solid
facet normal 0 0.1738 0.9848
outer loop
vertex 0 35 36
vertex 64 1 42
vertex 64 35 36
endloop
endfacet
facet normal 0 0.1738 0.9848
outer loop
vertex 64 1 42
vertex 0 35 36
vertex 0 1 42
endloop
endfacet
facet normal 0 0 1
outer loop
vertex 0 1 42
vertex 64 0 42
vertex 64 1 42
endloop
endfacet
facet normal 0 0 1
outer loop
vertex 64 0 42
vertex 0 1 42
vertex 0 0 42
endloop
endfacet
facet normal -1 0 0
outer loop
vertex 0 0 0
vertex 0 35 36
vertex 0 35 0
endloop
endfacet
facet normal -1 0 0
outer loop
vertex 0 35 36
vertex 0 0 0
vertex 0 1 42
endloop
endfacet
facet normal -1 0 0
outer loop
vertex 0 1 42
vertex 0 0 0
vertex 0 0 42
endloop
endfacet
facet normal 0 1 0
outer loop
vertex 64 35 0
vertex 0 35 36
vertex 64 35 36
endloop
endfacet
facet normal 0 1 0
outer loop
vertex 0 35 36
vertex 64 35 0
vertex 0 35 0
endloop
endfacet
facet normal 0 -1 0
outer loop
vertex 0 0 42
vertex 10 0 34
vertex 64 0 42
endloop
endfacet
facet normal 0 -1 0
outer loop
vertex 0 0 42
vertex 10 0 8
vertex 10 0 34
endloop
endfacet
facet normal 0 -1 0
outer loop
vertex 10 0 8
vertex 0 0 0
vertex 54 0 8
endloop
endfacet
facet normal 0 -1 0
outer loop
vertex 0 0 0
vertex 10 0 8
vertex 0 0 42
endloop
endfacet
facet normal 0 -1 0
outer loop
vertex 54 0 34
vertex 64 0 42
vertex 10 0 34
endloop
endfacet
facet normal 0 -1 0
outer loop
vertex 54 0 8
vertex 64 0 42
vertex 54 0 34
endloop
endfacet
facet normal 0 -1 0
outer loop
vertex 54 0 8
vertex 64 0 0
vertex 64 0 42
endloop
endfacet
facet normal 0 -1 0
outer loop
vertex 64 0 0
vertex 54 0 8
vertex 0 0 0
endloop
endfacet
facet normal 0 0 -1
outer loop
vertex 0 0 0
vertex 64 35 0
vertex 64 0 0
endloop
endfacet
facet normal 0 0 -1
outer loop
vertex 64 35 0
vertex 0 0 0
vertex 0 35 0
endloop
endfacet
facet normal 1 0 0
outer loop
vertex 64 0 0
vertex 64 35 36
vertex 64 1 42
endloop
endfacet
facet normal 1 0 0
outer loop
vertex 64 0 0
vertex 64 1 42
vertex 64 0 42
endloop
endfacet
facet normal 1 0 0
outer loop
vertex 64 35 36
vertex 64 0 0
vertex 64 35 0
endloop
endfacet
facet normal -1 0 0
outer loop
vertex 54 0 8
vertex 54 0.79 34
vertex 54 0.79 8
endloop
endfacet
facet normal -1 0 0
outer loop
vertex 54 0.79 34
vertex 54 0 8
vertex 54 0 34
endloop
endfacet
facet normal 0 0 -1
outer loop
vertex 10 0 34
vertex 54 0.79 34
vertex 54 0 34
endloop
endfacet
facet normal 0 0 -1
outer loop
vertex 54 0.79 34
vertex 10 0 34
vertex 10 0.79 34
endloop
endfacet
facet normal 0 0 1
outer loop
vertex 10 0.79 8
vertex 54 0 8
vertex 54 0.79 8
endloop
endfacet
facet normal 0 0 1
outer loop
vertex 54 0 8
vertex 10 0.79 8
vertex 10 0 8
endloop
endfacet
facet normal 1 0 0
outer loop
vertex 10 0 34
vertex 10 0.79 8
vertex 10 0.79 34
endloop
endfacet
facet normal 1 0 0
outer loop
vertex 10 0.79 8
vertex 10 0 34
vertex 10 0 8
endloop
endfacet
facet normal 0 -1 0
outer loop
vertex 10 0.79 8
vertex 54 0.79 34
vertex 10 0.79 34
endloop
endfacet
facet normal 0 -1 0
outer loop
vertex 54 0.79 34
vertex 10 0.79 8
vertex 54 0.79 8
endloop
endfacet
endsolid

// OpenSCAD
// booth/lt_podium.scad
// LT-meetup diorama props (7/23): single-colour fast prints, assembled later.
//   PART = "podium" : lectern the K151 stands behind (slanted reading top,
//                     front recess for a paper logo card 44 x 26)
//   PART = "stage"  : 150 x 100 x 8 riser plate with chamfered front edge
// Select at CLI:  openscad -D 'PART="stage"' -o stage.stl lt_podium.scad

include <../params.scad>;

PART = "podium";

module podium() {
    difference() {
        // outer block with slanted top (front high -> back low, robot side)
        hull() {
            cube([pod_w, pod_d, 1]);
            translate([0, 0, pod_h_front - 1]) cube([pod_w, 1, 1]);
            translate([0, pod_d - 1, pod_h_back - 1]) cube([pod_w, 1, 1]);
        }
        // NOTE: intentionally solid - a modelled hollow would close into a
        // ~59 mm unsupported bridge under the slanted top. Sparse slicer
        // infill (8-10%) keeps it fast instead.
        // front logo-card recess (paper 44 x 26)
        translate([(pod_w - pod_logo_w) / 2, -0.01, 8])
            cube([pod_logo_w, pod_logo_d, pod_logo_h]);
    }
}

module stage() {
    // riser plate, chamfered on the front (audience) edge
    hull() {
        translate([0, stage_chamfer, 0]) cube([stage_x, stage_y - stage_chamfer, stage_t]);
        translate([0, 0, stage_t - stage_chamfer])
            cube([stage_x, stage_y, stage_chamfer]);
        cube([stage_x, 1, 1]);
    }
}

if (PART == "stage") stage();
else                 podium();
